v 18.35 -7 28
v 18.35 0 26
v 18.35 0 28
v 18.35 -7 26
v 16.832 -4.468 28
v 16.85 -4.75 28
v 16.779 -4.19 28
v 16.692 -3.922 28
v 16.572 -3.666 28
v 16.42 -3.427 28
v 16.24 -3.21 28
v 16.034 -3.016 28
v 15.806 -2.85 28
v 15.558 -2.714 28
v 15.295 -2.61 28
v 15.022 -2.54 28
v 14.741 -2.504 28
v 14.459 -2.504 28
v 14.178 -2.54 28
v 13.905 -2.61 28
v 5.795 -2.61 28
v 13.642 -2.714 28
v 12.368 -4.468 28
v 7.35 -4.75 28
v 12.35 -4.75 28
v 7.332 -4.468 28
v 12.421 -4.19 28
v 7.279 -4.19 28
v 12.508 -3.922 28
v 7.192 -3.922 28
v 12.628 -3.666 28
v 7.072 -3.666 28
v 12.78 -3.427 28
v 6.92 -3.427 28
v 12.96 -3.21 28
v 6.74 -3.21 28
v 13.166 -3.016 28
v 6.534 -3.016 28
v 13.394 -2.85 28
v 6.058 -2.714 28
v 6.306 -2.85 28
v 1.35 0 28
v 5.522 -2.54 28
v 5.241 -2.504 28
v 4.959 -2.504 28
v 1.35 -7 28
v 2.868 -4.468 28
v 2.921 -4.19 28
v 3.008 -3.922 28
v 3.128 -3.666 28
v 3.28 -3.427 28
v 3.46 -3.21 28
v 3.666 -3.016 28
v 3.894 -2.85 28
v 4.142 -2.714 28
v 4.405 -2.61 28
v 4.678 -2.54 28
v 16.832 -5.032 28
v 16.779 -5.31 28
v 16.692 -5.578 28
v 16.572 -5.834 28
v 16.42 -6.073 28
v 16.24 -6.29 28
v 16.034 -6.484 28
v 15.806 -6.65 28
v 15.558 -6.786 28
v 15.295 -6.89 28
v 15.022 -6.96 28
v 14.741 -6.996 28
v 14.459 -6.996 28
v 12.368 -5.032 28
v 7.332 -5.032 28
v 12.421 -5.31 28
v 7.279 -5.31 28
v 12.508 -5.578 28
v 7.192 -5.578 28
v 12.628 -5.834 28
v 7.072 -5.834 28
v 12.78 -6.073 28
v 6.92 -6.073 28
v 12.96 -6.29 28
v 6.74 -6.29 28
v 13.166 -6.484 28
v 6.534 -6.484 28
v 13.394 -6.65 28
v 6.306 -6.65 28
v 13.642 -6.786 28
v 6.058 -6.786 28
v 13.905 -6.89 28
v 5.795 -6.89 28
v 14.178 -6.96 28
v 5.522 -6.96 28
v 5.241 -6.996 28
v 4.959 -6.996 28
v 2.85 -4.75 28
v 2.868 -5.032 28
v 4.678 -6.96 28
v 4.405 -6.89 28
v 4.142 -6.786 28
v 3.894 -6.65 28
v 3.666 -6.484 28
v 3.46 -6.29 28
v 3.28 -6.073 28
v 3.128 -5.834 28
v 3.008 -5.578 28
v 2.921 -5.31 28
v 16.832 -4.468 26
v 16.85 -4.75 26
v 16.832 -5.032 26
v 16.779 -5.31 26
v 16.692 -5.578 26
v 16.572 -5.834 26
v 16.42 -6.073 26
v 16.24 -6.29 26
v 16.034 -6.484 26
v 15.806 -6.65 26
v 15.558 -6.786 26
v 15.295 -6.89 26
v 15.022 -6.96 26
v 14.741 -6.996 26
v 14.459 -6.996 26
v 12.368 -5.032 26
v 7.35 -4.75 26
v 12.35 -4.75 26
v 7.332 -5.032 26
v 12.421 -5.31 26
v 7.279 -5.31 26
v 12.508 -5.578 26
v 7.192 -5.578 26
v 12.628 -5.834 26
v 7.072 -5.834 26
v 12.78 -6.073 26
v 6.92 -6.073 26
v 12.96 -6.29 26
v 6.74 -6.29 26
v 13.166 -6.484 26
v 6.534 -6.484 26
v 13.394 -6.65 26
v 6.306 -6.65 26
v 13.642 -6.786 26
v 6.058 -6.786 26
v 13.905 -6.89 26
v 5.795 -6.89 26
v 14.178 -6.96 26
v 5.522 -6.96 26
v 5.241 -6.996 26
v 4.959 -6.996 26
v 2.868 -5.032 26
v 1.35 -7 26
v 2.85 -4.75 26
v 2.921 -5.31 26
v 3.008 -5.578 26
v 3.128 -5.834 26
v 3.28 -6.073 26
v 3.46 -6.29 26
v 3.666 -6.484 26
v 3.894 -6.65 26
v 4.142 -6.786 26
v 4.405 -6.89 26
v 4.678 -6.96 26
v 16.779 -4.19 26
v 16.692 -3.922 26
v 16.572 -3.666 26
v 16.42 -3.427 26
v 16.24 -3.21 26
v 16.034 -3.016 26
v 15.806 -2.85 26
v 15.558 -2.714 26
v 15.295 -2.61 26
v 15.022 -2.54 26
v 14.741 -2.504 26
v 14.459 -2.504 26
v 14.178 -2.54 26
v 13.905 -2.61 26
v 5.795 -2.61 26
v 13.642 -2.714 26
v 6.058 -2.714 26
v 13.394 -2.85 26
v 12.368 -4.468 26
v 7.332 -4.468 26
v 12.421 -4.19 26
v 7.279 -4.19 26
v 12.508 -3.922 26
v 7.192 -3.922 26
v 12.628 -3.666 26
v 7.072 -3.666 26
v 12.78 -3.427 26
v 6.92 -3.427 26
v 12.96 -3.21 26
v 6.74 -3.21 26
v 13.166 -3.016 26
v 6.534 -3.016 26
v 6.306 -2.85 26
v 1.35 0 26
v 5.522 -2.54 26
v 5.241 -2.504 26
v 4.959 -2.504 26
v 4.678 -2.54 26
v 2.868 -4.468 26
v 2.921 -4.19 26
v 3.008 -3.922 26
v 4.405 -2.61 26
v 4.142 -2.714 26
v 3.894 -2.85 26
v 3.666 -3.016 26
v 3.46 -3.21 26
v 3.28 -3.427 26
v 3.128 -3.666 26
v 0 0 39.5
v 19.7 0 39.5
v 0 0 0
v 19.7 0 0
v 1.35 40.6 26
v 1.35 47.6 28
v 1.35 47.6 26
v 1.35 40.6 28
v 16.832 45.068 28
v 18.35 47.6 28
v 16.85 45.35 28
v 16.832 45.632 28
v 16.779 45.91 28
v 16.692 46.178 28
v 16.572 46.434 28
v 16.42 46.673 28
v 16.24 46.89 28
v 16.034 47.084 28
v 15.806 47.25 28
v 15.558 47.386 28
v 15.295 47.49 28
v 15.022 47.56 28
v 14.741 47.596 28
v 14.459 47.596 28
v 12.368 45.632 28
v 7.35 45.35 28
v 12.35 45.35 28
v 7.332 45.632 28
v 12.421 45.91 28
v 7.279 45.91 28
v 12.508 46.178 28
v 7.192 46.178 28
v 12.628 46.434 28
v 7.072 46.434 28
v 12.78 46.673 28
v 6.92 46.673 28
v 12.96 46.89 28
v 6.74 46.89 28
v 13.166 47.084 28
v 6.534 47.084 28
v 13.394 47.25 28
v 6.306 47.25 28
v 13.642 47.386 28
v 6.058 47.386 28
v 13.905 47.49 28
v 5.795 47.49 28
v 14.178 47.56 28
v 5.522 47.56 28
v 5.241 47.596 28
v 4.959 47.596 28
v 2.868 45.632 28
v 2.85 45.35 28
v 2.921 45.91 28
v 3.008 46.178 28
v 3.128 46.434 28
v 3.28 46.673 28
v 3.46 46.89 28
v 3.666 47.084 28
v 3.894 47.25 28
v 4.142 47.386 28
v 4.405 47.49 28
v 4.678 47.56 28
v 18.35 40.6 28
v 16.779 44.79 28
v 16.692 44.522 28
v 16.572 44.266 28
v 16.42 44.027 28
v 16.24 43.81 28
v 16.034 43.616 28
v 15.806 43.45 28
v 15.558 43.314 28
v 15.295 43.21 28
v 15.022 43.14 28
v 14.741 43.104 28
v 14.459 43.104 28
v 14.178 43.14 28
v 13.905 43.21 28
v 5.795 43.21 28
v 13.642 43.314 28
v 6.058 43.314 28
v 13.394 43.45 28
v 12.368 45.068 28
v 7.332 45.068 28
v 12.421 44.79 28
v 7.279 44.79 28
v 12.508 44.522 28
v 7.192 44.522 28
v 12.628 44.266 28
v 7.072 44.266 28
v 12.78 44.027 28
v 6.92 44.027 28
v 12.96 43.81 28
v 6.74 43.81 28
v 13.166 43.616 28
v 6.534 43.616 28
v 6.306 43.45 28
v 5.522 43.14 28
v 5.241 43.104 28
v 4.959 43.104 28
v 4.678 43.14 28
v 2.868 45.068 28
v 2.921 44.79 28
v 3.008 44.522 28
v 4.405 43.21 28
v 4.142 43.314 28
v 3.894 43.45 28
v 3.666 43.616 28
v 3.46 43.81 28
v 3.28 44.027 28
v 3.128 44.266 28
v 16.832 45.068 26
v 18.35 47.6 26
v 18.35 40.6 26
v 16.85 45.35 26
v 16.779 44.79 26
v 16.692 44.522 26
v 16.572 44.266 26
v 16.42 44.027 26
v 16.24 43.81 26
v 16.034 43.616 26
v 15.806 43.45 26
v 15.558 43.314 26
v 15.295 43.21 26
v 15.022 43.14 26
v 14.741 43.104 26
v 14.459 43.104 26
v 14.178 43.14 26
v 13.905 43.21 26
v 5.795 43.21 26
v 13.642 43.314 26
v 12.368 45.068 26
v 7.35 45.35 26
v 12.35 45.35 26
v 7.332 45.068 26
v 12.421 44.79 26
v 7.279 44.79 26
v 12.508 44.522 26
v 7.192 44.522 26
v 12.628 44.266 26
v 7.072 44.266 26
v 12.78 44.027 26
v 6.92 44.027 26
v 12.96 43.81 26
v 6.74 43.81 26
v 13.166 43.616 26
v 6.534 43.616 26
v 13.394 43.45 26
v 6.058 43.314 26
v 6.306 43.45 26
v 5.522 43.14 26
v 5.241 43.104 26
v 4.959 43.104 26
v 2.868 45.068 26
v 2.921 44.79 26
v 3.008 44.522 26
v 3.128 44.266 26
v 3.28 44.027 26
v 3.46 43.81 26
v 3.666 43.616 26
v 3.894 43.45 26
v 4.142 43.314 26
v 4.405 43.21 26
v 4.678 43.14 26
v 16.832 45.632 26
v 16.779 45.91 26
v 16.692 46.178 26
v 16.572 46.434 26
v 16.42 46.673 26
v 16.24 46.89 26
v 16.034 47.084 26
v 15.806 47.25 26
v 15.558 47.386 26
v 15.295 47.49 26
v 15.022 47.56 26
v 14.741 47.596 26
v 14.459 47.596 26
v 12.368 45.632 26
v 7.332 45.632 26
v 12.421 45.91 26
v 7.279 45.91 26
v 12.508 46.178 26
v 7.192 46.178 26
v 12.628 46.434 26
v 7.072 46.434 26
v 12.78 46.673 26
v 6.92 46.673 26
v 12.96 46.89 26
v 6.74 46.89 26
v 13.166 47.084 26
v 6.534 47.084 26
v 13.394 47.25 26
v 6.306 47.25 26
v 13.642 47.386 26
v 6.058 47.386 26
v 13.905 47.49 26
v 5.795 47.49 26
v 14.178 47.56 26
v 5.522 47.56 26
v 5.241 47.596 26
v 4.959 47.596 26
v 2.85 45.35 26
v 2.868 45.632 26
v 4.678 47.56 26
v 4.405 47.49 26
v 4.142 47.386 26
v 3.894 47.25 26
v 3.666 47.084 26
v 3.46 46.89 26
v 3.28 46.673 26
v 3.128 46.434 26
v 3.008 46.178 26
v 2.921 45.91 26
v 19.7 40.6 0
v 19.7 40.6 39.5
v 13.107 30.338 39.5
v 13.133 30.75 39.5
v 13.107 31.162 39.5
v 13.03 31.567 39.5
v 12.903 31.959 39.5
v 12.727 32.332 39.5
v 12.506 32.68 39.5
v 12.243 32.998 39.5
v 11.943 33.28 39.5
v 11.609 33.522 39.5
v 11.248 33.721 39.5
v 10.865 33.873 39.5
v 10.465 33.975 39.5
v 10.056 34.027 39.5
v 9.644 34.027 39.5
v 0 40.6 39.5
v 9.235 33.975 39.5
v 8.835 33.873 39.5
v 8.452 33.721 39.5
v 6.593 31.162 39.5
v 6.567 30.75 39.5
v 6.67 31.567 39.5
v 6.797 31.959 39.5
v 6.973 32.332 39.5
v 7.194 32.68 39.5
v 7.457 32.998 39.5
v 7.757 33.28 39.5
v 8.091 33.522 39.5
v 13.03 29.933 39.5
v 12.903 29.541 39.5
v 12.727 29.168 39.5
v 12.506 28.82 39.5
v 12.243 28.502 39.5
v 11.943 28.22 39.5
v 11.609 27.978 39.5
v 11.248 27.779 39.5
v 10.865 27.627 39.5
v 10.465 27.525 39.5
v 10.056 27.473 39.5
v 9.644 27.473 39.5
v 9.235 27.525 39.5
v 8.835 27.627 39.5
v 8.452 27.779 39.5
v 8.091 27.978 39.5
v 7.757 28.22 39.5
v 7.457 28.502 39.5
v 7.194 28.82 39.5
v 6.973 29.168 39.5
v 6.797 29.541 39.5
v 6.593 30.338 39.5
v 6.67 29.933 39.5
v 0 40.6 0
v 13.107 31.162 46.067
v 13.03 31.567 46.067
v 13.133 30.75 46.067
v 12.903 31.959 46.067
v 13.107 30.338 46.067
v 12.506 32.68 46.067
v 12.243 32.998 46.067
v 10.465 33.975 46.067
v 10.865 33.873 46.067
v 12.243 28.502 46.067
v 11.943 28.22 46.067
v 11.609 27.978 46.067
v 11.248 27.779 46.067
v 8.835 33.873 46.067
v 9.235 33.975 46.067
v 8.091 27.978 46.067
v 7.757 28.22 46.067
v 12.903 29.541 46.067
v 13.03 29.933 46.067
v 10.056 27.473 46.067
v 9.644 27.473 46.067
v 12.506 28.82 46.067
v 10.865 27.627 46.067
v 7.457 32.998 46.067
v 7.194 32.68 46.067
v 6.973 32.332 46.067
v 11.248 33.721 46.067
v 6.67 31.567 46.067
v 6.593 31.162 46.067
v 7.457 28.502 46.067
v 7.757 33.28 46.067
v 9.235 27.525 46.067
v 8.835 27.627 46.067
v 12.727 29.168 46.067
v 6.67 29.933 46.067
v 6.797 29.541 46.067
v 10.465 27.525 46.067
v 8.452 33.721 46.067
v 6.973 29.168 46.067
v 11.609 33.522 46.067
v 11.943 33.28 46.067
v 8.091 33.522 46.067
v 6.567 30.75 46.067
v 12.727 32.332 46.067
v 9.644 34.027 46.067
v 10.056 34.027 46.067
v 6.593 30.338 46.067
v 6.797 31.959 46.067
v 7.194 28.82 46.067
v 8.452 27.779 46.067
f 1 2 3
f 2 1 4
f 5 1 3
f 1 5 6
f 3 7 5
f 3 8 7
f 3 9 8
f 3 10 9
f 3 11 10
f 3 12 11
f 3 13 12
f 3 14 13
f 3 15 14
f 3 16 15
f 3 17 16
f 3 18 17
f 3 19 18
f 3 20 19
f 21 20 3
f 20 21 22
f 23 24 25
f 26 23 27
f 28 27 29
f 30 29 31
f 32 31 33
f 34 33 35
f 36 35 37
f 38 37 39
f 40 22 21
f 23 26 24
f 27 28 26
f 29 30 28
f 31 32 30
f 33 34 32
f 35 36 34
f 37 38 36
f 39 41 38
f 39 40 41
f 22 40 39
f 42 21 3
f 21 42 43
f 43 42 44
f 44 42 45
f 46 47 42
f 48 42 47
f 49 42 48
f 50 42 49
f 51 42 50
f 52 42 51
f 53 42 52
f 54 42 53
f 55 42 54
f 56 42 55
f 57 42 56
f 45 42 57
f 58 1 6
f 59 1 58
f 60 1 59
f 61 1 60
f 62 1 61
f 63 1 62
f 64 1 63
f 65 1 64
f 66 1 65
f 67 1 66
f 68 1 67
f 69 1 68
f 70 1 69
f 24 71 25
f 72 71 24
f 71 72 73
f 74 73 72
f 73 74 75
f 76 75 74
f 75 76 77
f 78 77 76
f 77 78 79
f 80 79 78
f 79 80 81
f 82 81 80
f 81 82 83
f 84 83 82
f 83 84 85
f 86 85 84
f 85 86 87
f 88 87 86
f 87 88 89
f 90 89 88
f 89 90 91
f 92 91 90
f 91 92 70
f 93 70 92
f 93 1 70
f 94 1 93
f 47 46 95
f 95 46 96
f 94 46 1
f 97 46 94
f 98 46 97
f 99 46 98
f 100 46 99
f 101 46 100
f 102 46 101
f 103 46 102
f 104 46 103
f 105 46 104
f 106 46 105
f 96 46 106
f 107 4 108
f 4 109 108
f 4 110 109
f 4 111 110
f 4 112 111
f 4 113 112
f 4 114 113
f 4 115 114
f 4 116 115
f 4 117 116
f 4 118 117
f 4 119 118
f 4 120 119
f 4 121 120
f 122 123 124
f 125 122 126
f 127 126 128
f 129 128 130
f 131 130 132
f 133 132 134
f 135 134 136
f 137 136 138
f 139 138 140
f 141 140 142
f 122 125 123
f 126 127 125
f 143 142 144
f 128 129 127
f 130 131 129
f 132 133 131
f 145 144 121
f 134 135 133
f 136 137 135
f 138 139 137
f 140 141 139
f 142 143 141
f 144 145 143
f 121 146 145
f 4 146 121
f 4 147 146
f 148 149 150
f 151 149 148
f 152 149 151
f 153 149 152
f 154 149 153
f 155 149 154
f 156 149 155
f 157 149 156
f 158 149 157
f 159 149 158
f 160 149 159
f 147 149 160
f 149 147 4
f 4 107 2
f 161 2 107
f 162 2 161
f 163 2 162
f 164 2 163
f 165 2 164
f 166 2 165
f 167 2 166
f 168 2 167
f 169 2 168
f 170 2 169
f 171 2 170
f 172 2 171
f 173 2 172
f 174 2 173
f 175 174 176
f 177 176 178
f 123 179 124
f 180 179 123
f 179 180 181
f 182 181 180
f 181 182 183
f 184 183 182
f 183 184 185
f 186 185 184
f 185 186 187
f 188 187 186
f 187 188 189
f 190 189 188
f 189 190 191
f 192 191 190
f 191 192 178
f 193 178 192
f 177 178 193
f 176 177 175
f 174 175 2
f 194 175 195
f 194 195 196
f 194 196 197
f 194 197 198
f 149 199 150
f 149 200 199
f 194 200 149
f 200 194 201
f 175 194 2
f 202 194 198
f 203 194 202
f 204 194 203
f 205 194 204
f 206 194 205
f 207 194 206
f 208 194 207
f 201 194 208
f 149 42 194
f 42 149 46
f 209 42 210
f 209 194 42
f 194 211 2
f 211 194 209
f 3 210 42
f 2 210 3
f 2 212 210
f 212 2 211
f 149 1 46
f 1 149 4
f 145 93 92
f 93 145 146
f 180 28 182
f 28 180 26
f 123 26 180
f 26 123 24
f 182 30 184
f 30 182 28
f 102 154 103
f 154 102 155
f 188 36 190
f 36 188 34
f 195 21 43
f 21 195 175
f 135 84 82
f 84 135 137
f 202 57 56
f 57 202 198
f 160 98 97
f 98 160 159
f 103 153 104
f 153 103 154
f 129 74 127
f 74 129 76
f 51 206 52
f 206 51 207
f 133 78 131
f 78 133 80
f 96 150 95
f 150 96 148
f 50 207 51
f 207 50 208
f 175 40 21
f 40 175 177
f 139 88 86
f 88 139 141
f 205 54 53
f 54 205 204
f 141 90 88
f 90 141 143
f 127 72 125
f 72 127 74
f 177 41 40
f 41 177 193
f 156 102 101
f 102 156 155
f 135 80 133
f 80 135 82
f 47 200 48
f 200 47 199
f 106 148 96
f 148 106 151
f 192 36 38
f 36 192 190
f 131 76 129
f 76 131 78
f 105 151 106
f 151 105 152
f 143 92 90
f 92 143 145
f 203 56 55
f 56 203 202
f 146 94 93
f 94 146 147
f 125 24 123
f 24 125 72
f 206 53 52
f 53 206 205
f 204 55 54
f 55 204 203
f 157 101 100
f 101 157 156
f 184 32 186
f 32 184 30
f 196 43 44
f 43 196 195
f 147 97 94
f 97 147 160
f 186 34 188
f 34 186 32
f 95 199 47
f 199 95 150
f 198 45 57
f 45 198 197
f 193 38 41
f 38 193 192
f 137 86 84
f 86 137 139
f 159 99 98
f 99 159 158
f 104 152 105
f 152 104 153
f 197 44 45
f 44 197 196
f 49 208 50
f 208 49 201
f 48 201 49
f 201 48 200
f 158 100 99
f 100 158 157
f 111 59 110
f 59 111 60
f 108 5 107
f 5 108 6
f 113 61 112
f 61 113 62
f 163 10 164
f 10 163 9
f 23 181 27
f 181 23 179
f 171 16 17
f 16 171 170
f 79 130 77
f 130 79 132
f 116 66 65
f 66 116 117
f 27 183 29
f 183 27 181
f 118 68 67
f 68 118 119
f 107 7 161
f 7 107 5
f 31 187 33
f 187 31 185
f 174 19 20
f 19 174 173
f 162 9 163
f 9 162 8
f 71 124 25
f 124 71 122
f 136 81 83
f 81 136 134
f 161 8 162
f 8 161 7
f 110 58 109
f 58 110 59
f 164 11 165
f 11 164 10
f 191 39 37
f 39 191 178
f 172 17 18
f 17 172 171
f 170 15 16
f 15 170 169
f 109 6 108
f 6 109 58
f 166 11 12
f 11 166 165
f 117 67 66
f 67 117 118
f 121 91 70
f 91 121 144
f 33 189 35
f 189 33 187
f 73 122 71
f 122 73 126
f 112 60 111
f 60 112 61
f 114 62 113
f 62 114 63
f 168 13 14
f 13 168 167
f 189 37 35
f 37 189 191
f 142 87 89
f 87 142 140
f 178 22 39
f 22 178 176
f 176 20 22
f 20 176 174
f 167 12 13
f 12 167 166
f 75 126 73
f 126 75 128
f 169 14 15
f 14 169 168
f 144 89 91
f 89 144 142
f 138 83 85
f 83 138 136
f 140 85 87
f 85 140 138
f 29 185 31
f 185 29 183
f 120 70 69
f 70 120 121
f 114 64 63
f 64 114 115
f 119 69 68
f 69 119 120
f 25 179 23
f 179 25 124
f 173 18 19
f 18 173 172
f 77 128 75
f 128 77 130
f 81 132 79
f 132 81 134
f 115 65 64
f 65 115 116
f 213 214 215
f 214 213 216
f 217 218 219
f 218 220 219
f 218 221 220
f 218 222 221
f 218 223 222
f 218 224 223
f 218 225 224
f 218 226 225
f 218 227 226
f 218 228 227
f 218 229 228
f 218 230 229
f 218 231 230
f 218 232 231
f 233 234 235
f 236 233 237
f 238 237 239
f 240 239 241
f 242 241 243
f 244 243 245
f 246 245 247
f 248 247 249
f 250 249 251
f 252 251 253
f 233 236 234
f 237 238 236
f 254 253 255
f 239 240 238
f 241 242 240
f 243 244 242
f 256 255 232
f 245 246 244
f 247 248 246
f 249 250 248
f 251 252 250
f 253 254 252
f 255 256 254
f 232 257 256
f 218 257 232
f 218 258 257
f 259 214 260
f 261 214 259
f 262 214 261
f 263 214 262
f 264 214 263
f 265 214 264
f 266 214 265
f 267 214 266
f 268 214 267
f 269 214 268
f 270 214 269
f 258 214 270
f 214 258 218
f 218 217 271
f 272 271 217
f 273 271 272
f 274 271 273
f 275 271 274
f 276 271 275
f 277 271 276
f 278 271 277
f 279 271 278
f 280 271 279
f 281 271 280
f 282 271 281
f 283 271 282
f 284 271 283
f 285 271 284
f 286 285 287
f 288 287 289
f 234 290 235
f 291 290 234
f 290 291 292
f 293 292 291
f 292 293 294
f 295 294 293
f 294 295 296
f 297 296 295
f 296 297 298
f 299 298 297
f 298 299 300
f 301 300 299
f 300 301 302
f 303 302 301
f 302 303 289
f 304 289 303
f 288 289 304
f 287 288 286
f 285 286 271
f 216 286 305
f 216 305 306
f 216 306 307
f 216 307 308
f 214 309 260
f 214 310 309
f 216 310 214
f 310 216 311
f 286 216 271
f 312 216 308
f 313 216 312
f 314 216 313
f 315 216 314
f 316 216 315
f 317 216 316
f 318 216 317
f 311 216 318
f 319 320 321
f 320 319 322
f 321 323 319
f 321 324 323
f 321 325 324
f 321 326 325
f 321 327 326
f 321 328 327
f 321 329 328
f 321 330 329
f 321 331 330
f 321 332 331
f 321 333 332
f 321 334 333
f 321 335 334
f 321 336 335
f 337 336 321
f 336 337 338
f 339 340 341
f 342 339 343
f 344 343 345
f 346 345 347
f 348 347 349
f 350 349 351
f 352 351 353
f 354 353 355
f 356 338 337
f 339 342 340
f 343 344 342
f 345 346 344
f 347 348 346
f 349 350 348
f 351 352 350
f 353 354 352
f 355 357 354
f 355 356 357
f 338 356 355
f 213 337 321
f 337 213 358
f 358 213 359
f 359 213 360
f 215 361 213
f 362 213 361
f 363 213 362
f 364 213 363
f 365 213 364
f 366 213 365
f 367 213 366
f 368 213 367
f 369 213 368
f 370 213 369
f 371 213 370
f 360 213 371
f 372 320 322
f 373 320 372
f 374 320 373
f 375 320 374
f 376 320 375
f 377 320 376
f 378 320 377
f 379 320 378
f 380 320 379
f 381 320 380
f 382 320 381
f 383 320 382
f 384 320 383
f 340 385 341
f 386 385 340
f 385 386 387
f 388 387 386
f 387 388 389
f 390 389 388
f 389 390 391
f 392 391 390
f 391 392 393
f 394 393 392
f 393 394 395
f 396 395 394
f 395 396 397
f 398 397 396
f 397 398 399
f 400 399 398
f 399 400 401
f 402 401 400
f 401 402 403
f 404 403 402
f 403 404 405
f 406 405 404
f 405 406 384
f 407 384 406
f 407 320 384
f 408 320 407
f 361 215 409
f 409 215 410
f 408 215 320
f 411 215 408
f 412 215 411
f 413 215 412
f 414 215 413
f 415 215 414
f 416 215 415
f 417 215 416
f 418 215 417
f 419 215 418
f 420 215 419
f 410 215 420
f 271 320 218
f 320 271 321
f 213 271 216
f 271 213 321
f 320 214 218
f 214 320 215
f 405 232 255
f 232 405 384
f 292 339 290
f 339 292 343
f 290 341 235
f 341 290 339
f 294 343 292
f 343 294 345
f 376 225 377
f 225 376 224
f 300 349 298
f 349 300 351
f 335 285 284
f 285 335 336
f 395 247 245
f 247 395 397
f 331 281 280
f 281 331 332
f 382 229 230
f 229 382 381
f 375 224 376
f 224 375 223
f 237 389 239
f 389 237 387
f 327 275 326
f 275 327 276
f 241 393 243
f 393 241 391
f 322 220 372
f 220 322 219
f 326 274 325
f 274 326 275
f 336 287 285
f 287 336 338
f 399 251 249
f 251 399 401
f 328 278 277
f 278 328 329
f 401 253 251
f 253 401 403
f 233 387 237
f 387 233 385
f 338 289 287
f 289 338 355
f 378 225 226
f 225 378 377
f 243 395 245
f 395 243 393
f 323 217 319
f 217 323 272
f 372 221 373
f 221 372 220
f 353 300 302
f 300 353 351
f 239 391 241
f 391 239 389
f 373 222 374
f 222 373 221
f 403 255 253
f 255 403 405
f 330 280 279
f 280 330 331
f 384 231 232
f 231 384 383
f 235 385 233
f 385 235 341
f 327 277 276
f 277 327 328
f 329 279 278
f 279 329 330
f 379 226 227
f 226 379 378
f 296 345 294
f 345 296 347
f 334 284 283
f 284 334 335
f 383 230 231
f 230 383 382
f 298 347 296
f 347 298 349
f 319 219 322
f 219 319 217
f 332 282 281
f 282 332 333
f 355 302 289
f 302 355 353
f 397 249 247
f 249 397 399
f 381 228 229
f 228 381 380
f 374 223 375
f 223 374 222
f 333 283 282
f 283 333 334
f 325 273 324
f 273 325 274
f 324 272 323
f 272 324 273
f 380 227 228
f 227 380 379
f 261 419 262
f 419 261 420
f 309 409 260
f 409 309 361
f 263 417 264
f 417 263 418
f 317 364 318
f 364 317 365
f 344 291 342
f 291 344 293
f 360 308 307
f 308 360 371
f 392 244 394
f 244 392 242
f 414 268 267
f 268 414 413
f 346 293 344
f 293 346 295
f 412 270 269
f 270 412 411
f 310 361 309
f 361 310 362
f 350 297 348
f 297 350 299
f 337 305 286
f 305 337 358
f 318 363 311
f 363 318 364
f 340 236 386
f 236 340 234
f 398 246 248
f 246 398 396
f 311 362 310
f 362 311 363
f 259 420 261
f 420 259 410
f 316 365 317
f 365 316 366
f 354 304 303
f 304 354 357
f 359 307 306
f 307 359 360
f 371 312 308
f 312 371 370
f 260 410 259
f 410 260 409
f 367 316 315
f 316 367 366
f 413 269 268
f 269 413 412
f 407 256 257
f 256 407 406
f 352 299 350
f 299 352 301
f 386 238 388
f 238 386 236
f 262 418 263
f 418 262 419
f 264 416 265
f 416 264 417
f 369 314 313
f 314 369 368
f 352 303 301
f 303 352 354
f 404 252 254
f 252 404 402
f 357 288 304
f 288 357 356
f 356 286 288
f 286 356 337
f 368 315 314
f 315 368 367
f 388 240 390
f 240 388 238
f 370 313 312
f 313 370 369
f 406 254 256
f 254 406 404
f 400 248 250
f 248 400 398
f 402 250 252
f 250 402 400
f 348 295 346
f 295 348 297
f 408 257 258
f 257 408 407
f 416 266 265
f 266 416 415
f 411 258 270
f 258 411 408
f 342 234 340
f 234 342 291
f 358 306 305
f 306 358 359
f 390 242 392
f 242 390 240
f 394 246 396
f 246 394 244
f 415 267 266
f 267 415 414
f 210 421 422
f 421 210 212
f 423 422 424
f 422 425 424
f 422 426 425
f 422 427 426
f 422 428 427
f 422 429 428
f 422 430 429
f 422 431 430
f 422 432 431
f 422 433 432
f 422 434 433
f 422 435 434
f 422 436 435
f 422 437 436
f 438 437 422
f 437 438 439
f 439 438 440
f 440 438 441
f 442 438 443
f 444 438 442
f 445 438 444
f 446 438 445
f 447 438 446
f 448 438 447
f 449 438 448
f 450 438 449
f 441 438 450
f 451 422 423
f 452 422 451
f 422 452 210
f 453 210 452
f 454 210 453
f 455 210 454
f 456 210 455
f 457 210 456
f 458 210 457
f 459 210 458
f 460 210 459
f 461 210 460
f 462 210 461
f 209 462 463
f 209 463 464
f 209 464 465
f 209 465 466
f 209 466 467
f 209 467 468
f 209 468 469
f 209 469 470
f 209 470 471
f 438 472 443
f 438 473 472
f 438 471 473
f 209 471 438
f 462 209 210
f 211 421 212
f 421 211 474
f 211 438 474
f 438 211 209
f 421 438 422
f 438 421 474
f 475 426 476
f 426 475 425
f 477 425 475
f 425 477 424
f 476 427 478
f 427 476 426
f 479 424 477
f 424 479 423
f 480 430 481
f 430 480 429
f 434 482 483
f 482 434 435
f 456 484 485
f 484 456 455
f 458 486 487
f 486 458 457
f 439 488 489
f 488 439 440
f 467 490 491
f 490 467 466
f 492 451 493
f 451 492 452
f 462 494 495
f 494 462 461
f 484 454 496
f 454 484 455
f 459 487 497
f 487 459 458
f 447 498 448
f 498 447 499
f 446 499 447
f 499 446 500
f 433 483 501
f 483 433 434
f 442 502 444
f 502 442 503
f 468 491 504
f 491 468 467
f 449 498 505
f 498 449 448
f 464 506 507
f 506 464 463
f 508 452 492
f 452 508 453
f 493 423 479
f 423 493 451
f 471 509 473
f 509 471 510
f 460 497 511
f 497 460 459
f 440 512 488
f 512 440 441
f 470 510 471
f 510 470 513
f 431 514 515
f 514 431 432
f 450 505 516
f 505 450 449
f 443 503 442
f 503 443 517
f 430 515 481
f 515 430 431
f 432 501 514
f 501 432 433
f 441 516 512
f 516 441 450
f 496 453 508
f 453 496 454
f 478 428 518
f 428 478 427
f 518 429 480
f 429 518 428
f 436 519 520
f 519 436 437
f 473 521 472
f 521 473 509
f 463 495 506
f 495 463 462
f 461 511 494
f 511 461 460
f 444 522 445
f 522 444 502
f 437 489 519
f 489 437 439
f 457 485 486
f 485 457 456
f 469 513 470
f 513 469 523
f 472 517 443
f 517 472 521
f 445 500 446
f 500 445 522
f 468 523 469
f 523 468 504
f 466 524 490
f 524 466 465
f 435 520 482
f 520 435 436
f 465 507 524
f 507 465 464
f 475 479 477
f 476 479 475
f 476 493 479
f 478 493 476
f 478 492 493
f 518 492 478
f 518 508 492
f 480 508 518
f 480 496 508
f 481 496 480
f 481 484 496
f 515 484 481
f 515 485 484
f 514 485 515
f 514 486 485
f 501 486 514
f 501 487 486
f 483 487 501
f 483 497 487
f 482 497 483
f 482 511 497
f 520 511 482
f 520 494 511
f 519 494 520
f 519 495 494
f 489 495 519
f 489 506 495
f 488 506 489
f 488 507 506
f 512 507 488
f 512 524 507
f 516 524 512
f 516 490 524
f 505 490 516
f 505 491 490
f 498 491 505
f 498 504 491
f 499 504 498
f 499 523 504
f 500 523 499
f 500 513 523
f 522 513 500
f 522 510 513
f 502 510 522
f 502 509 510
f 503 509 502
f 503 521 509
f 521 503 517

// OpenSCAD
//AMAX G5515AM servo

module fitting(fwidth, flength, fheight)
{
	//fitting
	mdiam=4.5;
	difference()
	{
		cube([fwidth,flength,fheight]);
		translate([fwidth/2-mdiam/2-2.5,mdiam/2,0])
		cylinder(h=fheight,r=mdiam/2);
		translate([fwidth/2+mdiam/2+2.5,mdiam/2,0])
		cylinder(h=fheight,r=mdiam/2);
	}
}

module G5515AM()
{
	//main body
	swidth=19.7;
	slength=40.6;
	sheight=39.5;
	cube([swidth,slength,sheight]);
	
	//fitting 1
	fwidth=17;
	flength=7;
	fheight=2;
	translate([(swidth-fwidth)/2,-flength,26])
	fitting(fwidth, flength, fheight);

	//fitting 2
	translate([(swidth-fwidth)/2,slength,26])
	translate([fwidth/2,flength/2,0])
	rotate([0,0,180])
	translate([-fwidth/2,-flength/2,0])
	fitting(fwidth, flength, fheight);
	
	//axis
	adiam=swidth/3;
	translate([swidth/2,slength-1.5*adiam,sheight])
	cylinder(h=adiam,r=adiam/2);
	
}
$fn=50;
G5515AM();
